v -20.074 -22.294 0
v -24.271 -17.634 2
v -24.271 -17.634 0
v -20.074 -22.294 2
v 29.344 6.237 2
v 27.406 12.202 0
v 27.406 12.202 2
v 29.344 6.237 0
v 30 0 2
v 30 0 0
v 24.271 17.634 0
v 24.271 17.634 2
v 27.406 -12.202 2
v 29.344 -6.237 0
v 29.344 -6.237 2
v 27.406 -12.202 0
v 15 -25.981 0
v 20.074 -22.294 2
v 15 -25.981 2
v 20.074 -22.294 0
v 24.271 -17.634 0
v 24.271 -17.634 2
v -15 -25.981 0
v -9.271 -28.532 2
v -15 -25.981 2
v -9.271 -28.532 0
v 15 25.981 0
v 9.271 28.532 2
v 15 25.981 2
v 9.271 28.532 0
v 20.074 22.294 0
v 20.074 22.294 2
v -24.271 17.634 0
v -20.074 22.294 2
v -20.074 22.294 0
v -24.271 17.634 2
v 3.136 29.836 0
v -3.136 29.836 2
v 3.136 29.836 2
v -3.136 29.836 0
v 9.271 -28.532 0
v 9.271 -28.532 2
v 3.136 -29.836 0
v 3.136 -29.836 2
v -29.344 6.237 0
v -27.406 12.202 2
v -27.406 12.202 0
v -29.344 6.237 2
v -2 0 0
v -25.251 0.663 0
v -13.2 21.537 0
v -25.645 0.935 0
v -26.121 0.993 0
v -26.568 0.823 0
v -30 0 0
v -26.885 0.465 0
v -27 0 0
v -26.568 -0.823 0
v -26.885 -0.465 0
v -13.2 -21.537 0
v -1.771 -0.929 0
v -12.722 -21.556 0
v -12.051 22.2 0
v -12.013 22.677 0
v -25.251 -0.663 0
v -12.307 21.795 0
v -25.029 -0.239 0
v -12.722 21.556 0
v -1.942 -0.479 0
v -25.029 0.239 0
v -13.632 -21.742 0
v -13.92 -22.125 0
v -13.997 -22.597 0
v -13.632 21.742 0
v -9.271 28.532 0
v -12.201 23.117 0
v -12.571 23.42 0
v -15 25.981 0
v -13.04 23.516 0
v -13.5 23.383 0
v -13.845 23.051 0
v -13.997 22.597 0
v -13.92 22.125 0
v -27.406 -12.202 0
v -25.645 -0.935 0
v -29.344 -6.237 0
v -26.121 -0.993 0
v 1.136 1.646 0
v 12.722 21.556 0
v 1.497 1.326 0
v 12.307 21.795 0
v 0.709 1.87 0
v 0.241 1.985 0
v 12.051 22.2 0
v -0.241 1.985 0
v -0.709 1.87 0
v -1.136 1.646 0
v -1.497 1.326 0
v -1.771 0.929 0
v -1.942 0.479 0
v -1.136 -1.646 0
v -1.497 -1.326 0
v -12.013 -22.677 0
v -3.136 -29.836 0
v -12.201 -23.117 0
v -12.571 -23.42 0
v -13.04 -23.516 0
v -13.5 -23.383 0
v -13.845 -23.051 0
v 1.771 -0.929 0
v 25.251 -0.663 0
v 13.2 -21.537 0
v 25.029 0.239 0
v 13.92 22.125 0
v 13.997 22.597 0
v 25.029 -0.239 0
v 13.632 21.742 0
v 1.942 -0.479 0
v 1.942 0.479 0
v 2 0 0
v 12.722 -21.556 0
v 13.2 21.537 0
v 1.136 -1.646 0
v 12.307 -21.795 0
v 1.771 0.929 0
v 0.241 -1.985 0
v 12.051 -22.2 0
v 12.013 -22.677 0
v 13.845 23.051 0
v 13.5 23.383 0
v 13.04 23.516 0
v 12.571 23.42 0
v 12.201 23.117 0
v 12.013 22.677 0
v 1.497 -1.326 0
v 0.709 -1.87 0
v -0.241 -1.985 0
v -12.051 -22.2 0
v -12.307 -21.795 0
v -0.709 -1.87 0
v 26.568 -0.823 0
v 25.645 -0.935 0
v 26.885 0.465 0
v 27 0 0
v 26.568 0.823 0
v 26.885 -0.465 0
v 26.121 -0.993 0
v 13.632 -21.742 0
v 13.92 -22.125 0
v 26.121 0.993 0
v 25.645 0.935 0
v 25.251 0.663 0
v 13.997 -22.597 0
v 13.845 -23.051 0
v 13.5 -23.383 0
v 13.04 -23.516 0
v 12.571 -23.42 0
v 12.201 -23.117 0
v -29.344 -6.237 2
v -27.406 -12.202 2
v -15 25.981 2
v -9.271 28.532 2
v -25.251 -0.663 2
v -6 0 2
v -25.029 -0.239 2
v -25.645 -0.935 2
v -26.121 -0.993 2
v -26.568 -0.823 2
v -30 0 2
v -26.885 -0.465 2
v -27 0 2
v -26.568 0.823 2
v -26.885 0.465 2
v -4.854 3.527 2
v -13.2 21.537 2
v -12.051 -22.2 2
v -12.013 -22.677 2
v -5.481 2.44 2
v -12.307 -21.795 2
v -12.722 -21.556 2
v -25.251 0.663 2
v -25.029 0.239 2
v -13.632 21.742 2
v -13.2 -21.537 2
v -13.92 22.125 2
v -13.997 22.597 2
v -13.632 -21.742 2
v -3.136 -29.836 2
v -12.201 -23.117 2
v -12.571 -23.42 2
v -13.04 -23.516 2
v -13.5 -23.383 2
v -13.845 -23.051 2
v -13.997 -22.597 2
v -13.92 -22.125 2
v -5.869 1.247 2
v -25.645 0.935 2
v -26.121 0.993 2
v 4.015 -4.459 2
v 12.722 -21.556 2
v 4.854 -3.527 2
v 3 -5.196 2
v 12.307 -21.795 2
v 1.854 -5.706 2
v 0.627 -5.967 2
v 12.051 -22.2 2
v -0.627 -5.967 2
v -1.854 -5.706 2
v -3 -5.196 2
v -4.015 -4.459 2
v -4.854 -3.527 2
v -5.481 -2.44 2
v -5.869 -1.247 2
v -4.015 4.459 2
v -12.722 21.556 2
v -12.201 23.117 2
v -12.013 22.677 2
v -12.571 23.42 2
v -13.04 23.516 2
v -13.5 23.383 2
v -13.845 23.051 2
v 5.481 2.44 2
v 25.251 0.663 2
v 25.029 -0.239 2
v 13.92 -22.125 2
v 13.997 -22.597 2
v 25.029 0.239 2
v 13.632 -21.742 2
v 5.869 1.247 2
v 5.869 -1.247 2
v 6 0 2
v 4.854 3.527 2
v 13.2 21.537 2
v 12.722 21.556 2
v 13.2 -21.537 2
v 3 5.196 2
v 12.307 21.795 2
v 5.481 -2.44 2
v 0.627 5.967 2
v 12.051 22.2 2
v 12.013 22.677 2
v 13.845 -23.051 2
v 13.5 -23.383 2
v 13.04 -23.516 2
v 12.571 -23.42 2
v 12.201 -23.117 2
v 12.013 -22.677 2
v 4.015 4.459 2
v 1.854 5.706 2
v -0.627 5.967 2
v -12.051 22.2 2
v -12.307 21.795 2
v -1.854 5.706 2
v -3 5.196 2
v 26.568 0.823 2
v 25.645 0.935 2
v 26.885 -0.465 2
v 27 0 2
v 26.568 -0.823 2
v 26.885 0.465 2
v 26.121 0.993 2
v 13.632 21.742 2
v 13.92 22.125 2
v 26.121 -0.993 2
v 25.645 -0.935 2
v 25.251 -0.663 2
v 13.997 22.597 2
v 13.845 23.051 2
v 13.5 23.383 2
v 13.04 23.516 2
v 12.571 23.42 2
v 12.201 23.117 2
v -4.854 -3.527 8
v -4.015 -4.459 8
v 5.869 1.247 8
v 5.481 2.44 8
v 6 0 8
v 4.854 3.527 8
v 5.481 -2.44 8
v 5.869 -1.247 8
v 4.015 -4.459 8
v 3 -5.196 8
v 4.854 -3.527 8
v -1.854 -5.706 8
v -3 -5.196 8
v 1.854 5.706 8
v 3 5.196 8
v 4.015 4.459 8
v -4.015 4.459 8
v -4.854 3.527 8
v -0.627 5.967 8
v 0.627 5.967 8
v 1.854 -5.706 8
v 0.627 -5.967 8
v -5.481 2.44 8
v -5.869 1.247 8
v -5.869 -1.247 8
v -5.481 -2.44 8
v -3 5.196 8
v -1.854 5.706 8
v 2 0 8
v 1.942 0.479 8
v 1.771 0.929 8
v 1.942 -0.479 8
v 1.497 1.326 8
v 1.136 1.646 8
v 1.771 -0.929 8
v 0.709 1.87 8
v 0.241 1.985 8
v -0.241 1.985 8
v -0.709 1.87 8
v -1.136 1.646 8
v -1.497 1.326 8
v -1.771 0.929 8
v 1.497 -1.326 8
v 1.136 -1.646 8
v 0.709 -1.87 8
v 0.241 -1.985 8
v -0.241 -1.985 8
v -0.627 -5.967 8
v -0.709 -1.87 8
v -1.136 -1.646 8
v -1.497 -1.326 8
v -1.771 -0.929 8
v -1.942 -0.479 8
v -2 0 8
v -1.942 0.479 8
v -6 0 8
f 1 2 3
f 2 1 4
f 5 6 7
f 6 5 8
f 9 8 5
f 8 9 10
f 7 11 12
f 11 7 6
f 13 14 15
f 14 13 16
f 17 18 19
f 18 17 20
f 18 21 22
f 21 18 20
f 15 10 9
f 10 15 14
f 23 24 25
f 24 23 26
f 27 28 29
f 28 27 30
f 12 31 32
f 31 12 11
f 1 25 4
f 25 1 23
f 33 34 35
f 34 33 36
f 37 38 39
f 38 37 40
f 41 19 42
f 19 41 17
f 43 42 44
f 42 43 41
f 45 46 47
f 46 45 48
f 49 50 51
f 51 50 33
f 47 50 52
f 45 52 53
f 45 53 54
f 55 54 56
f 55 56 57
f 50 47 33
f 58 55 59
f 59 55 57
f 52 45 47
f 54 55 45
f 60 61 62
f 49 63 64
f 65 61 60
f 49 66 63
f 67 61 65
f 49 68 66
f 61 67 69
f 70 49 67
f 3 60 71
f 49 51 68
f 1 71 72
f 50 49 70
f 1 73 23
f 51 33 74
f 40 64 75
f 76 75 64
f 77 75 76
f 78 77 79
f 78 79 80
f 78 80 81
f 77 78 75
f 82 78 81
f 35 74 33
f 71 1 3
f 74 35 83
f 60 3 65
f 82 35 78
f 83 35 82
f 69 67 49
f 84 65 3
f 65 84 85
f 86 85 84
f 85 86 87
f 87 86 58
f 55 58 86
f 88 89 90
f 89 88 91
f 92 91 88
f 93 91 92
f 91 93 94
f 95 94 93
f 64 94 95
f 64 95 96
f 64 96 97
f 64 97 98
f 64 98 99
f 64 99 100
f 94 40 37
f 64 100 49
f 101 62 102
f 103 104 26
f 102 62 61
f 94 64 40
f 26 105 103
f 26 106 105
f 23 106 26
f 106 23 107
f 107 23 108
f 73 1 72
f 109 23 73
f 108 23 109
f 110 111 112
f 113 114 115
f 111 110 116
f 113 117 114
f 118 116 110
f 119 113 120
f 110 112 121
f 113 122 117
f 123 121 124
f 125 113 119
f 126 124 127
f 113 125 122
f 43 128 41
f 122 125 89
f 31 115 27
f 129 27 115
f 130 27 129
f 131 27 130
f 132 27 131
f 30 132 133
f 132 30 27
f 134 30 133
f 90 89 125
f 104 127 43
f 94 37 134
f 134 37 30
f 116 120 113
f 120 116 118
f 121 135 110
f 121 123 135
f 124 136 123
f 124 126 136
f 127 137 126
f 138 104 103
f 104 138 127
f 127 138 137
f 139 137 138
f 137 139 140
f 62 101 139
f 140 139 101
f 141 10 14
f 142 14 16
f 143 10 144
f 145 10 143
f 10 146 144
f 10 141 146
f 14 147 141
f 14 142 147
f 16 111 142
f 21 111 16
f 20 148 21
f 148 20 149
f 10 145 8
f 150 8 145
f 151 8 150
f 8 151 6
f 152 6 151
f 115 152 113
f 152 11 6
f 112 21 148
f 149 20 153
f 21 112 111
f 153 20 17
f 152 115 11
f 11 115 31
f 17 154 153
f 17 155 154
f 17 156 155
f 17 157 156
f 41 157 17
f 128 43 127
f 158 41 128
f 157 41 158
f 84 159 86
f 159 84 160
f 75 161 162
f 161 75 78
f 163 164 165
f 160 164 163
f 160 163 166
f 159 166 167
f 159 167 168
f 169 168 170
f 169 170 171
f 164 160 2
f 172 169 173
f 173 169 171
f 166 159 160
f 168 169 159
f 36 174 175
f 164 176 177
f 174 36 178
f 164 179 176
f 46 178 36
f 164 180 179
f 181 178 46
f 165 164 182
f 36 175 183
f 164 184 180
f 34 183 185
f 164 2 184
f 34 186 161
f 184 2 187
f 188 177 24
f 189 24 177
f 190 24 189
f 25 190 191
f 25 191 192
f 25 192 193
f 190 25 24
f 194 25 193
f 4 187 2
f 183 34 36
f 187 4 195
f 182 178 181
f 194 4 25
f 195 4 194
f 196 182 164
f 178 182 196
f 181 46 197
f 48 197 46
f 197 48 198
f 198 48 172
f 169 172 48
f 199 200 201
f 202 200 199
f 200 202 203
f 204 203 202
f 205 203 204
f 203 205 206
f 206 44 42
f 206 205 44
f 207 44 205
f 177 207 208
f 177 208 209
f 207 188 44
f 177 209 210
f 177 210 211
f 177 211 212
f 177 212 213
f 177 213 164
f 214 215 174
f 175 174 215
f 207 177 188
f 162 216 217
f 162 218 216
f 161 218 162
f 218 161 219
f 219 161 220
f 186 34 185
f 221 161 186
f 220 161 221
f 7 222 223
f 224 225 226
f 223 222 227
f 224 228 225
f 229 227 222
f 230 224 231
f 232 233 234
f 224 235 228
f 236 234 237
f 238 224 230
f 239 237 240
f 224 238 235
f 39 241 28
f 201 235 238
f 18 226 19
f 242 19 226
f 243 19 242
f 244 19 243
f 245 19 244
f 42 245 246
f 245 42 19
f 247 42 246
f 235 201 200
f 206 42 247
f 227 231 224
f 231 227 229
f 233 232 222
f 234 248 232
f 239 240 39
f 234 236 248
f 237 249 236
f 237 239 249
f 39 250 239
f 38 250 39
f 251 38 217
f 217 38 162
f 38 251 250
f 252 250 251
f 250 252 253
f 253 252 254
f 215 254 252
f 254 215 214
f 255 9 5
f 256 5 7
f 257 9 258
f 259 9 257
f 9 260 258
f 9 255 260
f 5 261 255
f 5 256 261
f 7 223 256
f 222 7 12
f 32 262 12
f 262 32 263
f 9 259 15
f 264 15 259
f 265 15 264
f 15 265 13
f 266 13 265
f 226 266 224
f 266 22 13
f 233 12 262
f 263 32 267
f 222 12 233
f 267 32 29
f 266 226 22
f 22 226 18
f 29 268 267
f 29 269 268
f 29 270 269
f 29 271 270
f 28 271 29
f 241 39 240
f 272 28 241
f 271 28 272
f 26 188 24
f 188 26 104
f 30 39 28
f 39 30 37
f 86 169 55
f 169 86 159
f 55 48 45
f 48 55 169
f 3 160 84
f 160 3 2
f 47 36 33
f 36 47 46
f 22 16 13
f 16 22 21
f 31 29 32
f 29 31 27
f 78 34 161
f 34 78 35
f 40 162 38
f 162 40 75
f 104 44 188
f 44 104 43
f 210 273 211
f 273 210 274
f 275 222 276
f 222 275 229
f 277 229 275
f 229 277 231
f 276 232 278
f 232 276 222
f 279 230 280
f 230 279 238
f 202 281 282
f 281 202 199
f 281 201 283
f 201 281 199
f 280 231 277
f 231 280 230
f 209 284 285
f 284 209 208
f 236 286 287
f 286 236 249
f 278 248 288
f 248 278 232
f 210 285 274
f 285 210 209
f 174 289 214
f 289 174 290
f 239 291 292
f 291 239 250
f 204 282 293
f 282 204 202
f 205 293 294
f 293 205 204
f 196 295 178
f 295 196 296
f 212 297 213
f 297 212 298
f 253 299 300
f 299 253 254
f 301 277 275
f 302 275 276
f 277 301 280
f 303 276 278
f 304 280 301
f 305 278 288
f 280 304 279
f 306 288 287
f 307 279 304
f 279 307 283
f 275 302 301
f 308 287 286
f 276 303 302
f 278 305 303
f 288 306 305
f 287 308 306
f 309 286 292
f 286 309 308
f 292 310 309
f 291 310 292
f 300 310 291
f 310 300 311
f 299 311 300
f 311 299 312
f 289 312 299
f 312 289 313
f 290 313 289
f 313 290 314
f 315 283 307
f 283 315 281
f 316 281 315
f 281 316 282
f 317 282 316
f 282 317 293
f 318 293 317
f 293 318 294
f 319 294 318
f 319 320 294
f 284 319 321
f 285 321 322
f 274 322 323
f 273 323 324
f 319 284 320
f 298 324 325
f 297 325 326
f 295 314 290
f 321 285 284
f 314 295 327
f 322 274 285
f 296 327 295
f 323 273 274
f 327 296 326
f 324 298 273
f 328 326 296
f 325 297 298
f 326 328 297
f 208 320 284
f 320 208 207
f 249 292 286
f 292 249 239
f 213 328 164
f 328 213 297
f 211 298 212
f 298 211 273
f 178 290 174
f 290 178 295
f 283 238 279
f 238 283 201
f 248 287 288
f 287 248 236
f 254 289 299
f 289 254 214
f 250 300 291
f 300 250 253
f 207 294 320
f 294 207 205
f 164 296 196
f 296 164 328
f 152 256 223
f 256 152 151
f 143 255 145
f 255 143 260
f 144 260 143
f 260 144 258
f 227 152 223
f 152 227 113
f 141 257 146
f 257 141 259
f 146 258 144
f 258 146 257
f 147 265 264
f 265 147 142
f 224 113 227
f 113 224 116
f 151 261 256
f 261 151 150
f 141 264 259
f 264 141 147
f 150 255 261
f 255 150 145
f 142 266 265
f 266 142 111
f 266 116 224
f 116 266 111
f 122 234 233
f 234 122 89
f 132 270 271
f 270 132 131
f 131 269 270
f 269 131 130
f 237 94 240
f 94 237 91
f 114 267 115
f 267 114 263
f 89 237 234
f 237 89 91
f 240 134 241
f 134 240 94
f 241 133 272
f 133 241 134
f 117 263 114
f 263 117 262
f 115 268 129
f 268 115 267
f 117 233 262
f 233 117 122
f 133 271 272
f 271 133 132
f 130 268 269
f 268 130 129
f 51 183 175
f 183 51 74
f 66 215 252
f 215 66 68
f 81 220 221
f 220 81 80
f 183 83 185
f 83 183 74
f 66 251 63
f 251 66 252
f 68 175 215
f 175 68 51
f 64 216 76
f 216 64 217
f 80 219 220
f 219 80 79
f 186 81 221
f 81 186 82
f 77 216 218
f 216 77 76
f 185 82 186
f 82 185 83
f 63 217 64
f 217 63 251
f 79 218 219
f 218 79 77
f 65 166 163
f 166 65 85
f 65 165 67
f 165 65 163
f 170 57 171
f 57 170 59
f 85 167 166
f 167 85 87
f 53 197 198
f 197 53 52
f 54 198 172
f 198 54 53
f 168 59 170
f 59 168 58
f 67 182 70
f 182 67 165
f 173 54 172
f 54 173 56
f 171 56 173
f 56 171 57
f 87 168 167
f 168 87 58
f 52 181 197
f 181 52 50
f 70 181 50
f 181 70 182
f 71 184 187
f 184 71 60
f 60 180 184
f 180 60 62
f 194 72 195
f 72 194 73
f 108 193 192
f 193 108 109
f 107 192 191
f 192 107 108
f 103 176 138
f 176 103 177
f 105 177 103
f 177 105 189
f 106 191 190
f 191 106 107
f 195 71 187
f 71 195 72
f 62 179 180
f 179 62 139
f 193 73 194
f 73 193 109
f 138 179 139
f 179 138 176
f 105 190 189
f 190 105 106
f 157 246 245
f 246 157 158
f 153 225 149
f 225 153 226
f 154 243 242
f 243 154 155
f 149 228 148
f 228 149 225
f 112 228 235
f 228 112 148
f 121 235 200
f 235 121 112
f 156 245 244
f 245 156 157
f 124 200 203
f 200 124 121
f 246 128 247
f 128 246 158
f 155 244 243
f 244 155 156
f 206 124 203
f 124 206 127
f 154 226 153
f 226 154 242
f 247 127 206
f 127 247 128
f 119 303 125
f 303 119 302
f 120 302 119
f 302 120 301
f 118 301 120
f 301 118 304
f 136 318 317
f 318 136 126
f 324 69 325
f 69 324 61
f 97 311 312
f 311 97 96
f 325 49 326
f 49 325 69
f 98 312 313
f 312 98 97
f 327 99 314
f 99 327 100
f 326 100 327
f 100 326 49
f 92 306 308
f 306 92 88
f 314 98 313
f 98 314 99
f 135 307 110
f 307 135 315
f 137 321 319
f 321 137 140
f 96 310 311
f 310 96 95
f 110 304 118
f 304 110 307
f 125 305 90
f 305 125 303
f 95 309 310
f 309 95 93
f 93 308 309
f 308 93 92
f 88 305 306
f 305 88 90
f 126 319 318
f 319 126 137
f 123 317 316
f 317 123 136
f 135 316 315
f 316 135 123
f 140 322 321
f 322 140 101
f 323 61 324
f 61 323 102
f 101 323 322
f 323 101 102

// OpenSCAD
// tumblerHub.scad

hubRadius = 30;

$fs = 0.5;

difference(){

	union(){
	
		cylinder(h=2, r=hubRadius);
	
		translate(v=[0,0,2]){
			cylinder(h=6, r = 6);
		}
	}
	cylinder(h=9, r=2);

	for(angle=[0:60:300]) {
		echo("<b>angle:</b> ",angle);
		rotate(a=angle, v=[0,0,1]) {
			translate(v=[hubRadius - 4,0,0]){
				cylinder(h=2, r=1);
			}
		}
	}
}
